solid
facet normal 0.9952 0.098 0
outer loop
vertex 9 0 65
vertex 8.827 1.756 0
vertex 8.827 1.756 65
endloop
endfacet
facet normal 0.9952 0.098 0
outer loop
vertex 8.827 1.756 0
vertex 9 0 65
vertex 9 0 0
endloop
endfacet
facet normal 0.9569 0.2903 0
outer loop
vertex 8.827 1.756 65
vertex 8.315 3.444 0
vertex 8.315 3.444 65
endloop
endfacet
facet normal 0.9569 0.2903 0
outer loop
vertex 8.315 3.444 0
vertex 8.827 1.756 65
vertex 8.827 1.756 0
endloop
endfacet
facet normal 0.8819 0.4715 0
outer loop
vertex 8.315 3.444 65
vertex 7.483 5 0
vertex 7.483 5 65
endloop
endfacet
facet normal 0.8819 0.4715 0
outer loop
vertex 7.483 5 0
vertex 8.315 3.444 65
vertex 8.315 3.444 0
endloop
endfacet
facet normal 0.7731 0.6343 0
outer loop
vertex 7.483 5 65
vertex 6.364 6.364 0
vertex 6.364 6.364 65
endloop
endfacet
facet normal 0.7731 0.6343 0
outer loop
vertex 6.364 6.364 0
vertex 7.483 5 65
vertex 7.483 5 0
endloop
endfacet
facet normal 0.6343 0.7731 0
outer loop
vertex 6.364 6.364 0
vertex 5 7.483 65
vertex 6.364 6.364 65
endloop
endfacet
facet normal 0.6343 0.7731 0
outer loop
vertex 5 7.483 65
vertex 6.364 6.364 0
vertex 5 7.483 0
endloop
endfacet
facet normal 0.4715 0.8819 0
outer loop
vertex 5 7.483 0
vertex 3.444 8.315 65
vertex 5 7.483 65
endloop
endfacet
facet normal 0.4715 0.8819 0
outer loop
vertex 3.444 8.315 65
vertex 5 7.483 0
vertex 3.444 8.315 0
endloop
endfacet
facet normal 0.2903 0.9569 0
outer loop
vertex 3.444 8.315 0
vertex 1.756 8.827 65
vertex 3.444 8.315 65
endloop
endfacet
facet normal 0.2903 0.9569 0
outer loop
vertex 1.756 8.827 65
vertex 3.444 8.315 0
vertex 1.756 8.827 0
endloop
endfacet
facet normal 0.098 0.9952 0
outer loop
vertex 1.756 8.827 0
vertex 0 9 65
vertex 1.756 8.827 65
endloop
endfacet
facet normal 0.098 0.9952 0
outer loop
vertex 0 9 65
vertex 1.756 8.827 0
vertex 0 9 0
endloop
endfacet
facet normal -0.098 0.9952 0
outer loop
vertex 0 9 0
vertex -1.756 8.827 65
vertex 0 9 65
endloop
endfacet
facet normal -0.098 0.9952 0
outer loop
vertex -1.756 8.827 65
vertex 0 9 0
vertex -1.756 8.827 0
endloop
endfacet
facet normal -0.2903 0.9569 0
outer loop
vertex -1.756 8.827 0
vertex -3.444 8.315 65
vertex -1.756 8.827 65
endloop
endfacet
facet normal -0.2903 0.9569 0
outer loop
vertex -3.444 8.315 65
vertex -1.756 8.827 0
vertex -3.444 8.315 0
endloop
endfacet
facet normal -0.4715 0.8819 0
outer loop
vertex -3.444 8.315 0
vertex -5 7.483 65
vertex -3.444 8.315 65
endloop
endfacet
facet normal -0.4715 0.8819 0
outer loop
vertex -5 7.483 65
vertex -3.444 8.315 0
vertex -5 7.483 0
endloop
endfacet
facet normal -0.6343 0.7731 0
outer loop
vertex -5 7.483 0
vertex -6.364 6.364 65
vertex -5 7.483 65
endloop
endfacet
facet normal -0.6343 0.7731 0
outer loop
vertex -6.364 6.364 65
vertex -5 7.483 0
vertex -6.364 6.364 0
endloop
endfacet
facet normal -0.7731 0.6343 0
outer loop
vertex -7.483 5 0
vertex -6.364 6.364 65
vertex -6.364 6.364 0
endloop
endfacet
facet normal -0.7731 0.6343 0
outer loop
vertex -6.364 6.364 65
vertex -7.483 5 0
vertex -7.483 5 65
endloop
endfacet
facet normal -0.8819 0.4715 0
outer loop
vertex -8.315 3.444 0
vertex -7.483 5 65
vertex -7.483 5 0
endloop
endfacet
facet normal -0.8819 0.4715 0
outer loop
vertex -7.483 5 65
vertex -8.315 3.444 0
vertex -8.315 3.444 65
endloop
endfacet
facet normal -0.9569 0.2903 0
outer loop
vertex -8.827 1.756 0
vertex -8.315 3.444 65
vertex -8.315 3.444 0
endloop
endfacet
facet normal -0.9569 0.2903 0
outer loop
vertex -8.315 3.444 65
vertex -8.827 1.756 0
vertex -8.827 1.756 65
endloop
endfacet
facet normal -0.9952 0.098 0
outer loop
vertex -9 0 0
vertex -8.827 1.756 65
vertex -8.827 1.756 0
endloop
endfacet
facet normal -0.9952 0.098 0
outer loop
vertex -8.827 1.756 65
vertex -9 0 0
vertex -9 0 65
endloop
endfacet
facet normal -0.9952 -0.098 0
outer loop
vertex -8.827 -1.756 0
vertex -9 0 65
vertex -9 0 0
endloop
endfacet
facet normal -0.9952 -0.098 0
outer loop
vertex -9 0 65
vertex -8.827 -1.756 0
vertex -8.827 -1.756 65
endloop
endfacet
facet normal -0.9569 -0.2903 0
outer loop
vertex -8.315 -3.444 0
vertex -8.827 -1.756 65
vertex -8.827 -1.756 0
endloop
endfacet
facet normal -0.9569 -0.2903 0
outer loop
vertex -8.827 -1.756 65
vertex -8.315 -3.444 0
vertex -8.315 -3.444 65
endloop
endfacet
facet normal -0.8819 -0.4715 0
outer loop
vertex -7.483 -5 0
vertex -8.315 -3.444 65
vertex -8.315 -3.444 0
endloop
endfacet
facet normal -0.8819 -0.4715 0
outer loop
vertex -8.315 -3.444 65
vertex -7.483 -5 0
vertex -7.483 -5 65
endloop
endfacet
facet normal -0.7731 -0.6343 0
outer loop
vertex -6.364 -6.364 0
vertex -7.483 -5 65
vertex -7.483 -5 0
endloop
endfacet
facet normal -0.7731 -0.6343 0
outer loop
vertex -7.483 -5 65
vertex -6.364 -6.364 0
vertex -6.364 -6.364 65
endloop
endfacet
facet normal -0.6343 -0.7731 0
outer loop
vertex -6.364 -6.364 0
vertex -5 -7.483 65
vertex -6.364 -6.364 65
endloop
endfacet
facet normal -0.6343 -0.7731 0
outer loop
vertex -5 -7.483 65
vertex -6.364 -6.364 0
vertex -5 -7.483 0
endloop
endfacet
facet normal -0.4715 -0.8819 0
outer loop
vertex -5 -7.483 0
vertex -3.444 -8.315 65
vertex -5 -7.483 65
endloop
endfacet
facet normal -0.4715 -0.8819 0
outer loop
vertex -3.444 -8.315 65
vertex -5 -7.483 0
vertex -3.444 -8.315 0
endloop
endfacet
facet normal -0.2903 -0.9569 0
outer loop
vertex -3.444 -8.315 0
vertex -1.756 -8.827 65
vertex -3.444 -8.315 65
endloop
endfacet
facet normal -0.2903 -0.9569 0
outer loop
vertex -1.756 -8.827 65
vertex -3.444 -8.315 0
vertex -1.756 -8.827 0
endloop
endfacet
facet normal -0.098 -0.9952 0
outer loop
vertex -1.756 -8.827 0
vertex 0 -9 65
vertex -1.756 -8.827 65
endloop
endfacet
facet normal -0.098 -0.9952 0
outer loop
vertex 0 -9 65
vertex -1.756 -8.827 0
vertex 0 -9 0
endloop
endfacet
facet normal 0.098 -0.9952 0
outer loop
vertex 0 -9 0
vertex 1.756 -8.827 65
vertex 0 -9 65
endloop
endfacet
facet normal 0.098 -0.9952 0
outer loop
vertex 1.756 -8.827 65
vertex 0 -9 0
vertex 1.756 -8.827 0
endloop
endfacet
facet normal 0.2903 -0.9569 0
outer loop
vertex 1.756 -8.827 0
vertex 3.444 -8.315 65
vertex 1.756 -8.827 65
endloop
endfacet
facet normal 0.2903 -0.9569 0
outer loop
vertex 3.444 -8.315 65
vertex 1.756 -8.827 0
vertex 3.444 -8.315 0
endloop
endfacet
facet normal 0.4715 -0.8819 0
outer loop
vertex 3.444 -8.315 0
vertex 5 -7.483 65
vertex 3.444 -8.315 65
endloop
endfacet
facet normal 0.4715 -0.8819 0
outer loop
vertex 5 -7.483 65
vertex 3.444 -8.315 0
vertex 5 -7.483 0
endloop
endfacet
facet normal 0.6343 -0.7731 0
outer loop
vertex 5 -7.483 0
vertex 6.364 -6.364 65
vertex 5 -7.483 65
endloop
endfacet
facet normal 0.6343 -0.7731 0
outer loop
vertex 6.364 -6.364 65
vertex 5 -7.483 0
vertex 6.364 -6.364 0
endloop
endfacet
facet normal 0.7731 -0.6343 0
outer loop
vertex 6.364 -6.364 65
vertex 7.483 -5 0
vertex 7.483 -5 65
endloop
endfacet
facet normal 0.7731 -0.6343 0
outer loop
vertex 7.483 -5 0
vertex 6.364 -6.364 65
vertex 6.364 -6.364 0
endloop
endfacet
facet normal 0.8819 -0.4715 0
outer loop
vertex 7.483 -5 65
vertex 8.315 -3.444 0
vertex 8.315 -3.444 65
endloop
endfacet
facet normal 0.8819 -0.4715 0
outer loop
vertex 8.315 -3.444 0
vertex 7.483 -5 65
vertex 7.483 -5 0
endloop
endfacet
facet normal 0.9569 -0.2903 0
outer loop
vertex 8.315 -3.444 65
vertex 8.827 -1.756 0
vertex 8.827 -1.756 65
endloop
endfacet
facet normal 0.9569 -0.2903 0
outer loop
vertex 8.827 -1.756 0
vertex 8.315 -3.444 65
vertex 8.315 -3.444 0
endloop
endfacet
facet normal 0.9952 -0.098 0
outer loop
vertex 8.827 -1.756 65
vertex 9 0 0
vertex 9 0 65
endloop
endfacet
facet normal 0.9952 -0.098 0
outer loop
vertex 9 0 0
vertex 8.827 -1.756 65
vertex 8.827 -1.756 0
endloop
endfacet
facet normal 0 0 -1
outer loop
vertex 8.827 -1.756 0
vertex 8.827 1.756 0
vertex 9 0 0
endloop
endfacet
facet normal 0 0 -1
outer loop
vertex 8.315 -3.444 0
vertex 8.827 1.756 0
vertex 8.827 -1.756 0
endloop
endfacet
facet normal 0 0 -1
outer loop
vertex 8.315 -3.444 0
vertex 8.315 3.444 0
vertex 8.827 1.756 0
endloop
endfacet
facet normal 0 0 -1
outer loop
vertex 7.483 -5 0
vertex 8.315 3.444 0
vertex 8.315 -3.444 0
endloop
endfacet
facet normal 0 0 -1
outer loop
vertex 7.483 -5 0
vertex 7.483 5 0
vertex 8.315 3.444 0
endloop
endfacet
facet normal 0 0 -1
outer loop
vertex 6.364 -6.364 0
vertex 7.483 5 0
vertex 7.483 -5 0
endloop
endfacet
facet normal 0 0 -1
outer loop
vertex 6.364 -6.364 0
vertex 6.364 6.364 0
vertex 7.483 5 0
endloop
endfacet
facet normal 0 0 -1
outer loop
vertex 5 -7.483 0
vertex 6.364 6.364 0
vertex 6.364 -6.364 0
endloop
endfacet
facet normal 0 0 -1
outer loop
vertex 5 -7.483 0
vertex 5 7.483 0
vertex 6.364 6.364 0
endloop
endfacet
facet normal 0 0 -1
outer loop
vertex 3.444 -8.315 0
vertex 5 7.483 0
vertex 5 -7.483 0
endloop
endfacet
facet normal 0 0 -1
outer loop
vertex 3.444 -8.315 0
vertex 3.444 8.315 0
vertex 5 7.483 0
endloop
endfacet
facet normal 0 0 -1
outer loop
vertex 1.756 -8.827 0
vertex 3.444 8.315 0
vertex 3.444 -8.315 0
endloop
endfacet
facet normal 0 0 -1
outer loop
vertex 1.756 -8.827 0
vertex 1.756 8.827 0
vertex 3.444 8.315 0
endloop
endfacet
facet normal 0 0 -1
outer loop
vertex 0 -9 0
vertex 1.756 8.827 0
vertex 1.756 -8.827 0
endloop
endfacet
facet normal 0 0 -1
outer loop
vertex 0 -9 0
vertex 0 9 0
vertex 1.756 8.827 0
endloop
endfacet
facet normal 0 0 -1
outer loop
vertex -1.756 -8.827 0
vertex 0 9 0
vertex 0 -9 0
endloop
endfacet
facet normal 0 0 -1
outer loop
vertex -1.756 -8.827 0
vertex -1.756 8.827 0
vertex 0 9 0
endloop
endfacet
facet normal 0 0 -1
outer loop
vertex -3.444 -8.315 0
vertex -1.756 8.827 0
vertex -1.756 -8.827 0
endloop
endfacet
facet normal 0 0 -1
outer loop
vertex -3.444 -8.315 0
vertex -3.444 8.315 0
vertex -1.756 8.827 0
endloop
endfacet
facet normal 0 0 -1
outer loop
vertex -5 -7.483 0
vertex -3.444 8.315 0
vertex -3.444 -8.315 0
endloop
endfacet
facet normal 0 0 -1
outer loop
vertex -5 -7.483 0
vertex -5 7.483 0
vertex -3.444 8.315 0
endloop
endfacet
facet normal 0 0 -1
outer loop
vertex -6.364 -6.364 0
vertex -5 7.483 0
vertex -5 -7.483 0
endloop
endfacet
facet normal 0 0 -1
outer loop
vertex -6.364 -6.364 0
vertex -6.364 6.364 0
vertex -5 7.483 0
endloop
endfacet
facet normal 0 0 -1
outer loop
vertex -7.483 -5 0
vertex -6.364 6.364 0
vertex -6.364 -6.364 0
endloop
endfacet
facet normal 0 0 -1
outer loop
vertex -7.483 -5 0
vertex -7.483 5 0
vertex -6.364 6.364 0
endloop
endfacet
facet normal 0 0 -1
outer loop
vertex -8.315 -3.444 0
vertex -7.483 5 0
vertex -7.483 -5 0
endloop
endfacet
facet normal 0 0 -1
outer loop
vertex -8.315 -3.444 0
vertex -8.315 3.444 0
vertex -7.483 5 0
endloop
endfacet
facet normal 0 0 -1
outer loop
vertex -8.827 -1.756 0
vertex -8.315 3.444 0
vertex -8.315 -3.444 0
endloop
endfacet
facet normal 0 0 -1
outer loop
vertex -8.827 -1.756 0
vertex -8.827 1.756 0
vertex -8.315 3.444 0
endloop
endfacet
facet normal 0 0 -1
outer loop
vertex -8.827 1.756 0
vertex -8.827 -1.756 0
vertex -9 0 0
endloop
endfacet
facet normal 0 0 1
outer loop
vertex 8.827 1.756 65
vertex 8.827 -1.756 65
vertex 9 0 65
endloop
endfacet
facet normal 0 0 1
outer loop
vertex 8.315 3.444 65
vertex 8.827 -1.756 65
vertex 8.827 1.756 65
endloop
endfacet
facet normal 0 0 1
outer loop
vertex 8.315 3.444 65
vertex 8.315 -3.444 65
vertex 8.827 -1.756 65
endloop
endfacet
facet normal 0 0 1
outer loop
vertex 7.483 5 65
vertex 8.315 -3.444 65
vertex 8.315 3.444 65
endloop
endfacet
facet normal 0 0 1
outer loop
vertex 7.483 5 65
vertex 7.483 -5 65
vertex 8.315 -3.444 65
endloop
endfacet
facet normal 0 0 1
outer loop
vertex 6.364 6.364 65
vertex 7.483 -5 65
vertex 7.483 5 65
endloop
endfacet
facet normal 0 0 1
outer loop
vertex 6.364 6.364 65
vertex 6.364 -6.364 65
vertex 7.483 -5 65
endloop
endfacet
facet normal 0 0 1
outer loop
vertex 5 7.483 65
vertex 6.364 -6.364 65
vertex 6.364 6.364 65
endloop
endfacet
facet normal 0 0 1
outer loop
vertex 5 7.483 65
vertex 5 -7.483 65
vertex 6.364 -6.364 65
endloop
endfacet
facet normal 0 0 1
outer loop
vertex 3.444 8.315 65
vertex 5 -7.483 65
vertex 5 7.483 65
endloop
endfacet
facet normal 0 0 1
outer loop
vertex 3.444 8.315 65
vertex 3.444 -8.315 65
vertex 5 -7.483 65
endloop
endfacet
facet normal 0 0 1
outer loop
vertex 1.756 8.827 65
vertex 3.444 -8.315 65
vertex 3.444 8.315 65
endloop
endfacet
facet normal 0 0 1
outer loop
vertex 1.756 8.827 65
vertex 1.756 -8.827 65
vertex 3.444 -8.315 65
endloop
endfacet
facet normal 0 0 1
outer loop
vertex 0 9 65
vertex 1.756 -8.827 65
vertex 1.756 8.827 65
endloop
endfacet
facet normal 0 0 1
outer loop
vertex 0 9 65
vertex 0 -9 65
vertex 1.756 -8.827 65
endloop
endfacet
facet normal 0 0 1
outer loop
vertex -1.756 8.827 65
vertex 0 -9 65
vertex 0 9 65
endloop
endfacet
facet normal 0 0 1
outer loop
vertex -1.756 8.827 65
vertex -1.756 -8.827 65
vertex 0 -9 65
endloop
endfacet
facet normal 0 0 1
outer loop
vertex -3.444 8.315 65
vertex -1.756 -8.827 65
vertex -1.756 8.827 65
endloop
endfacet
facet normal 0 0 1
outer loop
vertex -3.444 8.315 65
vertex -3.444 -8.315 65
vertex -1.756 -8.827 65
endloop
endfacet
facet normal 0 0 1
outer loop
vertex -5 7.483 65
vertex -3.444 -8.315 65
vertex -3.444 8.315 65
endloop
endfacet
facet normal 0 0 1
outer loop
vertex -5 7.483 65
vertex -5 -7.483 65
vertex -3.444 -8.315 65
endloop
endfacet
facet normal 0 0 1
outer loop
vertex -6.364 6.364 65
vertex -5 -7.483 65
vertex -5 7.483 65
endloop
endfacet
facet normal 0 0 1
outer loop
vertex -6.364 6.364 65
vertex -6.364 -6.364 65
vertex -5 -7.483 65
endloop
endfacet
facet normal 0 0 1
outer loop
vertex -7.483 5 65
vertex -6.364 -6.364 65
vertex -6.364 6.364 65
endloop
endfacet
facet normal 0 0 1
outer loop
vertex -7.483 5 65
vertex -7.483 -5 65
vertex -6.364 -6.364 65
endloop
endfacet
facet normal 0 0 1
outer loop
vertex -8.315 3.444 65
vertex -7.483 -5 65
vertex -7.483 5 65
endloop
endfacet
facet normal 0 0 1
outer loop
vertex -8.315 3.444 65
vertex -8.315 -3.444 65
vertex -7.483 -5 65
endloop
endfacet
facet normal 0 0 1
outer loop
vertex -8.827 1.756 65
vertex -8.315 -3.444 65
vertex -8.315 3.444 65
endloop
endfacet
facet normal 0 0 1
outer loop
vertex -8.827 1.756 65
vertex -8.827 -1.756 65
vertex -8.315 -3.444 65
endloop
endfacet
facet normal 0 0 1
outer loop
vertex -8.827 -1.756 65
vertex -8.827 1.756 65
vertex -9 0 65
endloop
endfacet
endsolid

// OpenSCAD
  echo ("Rabota Baltatchev ");
      
      acc18650();
      
      module acc18650() {
          color("violet")
          cylinder(d=18, h=65, $fn=32);
      }
